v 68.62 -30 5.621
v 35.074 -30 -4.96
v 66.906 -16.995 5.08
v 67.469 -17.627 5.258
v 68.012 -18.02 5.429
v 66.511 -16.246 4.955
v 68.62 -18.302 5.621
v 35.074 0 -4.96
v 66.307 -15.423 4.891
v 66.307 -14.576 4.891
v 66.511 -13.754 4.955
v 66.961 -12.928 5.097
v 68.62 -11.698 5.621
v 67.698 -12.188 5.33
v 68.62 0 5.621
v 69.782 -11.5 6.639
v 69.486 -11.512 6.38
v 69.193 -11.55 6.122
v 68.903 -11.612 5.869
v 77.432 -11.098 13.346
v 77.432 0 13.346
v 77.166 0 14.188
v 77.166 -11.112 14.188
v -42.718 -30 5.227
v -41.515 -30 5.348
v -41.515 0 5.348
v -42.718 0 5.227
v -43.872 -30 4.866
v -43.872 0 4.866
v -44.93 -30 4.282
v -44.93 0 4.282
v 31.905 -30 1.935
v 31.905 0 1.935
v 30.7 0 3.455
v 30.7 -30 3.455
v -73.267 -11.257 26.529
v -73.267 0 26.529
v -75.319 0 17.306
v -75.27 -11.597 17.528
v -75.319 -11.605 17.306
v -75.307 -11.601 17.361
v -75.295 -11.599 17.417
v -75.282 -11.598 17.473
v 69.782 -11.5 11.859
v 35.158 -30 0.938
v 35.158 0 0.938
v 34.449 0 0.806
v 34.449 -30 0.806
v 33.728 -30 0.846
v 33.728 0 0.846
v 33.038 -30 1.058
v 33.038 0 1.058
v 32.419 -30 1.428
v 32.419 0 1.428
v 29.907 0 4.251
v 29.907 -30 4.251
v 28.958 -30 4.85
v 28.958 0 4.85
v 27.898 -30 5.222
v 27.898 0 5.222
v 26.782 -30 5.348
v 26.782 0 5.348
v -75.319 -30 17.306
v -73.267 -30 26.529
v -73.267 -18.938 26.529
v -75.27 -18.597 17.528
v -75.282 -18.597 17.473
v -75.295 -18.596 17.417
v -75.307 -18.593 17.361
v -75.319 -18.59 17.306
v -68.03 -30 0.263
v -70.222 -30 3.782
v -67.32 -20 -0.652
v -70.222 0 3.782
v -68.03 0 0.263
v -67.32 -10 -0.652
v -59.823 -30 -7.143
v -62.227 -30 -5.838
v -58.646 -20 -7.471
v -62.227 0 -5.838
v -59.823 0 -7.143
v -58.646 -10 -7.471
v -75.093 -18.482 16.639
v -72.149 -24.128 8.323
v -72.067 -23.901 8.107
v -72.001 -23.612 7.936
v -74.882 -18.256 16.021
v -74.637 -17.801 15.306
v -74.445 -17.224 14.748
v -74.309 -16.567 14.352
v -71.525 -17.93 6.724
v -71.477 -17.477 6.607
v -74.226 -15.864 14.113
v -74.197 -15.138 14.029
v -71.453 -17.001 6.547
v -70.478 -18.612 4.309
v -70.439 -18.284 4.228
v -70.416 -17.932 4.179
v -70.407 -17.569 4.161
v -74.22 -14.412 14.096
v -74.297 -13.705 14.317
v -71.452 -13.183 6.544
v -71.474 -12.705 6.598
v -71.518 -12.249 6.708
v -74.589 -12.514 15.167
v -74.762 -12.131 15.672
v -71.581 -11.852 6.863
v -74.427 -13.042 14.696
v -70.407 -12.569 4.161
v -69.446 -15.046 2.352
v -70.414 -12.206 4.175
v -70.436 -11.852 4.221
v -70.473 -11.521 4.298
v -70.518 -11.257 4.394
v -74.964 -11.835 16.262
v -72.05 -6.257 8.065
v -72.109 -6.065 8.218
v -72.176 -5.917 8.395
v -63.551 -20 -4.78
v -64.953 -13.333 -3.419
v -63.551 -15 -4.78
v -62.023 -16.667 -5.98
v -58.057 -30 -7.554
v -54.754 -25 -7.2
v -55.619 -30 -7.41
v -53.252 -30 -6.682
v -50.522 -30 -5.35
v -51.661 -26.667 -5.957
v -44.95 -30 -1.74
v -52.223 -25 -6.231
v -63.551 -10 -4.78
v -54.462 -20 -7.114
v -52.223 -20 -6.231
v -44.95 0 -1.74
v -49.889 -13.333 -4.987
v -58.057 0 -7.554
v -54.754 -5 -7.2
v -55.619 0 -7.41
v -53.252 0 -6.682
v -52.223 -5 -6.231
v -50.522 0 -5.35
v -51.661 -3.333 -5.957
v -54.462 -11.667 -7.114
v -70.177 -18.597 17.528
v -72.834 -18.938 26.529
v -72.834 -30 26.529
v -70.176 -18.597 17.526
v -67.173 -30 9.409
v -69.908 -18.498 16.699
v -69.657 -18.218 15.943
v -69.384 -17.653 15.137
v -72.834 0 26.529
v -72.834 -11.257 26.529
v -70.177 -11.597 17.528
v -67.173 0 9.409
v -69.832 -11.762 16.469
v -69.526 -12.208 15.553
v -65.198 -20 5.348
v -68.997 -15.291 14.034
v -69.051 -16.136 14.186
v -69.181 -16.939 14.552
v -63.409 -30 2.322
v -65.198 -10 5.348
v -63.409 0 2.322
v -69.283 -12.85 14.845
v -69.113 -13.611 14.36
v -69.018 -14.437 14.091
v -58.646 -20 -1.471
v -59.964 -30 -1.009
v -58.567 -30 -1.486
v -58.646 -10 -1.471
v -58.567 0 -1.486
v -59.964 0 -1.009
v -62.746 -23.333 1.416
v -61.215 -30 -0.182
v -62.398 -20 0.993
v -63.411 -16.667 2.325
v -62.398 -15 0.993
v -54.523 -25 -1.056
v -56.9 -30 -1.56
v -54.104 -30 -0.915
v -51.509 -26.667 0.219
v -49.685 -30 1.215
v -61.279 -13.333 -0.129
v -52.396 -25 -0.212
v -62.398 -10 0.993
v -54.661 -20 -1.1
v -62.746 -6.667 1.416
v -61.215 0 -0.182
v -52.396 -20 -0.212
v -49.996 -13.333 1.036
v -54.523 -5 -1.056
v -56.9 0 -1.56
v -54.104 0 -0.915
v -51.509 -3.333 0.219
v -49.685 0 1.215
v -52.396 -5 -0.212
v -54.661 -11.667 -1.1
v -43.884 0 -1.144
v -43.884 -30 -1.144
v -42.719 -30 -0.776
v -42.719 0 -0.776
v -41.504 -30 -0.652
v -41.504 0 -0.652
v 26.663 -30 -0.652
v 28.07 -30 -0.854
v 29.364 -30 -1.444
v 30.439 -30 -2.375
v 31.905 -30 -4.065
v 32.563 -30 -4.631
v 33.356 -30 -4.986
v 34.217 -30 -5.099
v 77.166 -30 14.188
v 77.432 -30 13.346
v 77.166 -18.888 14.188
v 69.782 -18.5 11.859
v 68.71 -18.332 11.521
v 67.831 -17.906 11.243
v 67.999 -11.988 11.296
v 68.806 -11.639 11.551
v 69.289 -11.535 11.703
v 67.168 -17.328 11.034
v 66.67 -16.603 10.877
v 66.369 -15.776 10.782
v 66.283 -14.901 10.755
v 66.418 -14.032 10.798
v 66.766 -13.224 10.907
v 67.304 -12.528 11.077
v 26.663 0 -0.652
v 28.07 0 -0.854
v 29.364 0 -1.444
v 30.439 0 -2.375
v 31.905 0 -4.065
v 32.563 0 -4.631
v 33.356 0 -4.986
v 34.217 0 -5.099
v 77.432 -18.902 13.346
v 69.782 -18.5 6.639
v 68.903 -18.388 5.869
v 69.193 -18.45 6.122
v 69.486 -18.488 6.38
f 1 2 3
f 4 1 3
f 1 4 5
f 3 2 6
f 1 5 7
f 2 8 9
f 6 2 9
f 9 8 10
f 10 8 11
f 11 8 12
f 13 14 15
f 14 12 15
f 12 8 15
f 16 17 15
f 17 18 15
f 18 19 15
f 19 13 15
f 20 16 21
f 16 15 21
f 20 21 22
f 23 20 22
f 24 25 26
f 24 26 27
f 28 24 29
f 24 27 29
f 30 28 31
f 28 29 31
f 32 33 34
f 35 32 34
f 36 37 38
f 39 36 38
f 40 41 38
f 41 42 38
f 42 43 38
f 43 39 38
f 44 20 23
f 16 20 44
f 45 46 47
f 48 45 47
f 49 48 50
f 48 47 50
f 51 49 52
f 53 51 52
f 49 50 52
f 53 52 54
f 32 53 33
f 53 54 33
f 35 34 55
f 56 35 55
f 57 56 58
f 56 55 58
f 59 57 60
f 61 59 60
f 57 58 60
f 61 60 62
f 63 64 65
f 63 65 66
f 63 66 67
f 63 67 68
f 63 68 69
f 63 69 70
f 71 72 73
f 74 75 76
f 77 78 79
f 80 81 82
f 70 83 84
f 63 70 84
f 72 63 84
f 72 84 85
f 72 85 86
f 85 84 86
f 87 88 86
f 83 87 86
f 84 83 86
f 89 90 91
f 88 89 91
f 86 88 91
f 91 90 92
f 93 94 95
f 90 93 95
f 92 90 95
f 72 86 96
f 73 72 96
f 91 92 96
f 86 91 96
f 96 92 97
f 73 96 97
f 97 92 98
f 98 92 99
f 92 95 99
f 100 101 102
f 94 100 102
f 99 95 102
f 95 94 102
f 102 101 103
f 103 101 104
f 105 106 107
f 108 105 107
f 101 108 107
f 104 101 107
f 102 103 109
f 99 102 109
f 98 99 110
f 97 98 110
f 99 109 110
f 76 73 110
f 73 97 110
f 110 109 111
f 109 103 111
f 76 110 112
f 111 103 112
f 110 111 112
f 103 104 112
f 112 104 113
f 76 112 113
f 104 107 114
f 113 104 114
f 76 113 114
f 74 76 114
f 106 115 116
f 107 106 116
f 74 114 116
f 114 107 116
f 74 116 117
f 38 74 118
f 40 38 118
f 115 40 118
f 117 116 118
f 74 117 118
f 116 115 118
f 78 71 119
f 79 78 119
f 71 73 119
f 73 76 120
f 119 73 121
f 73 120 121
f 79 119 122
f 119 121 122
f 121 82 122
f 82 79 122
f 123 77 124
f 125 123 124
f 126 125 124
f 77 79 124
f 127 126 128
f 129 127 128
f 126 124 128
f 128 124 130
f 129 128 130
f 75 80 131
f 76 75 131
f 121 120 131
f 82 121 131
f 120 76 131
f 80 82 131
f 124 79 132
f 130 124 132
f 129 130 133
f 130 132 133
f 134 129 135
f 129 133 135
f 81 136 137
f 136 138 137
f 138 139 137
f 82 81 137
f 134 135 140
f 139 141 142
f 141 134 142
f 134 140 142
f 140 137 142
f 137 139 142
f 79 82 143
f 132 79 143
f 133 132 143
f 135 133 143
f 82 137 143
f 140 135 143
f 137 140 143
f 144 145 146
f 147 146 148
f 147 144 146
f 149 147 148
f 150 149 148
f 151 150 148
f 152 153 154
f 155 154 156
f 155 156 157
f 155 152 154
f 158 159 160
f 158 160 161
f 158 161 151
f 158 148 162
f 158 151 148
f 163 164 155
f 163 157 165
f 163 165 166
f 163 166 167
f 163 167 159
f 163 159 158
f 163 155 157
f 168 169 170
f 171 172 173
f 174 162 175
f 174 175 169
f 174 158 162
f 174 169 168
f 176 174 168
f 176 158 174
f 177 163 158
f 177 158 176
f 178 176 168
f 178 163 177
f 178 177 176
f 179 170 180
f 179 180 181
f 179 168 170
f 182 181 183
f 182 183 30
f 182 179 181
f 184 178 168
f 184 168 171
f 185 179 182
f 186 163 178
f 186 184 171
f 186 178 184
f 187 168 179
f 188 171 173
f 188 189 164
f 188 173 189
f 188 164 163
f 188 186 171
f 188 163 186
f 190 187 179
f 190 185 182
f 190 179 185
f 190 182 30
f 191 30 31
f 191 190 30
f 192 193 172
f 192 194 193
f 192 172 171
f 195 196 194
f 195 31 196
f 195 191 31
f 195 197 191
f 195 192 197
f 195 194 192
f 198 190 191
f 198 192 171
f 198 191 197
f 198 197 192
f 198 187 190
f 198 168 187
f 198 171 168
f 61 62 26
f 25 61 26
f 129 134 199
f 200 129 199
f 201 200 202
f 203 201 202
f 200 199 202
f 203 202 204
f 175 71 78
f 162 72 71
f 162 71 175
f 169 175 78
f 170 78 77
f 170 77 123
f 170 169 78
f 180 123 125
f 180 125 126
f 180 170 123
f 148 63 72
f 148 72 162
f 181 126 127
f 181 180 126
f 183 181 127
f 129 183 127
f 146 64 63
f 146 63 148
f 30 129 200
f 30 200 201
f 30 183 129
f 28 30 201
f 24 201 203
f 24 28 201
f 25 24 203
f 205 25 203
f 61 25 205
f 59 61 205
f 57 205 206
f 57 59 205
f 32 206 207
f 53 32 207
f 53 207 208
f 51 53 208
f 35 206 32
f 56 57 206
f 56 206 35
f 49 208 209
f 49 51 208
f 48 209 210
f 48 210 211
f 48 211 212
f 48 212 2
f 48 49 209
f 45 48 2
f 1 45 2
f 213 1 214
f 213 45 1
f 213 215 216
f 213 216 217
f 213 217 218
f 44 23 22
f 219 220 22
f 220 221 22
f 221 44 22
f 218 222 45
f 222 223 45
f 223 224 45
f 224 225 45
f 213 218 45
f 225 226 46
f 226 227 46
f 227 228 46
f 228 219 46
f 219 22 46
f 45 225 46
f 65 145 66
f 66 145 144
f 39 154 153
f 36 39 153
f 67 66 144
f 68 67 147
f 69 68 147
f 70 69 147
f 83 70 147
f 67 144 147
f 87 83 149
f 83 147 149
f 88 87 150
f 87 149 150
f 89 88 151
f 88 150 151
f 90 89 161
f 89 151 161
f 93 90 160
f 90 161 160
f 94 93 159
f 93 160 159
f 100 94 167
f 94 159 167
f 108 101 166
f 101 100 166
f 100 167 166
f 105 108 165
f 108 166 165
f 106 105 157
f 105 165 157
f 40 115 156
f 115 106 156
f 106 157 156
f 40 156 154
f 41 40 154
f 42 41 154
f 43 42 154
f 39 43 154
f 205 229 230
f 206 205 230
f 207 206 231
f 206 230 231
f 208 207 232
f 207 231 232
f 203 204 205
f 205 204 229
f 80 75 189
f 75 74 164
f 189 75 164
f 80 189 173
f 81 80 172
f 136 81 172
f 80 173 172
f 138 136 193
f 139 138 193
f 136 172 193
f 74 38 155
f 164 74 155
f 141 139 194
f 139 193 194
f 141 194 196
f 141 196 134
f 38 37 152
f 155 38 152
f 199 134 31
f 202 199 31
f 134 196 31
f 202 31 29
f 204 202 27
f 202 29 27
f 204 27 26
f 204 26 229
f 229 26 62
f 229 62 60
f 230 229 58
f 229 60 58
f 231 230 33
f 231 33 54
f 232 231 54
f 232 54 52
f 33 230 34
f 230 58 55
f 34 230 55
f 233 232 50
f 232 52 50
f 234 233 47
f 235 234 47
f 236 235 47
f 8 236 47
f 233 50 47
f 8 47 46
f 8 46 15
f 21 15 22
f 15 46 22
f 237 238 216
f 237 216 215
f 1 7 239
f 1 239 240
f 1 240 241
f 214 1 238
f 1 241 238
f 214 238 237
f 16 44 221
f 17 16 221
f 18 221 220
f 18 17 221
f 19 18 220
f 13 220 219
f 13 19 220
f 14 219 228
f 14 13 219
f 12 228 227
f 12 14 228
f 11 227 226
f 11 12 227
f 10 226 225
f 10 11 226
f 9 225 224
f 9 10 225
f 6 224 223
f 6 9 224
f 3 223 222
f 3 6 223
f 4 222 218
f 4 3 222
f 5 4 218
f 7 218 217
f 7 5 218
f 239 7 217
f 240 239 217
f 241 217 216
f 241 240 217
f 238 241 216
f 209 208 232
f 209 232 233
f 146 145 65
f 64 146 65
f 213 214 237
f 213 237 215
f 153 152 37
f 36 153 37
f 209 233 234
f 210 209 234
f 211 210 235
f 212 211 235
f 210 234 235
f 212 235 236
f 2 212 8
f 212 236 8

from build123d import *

# Parameters (mm, degrees)
F1_DEPTH = 30
F3_START = -60
F3_DEPTH = 20
F5_DEPTH = 15


with BuildPart() as f1:
    # F0 (on Front) → F1 (new body)
    with BuildSketch(Plane.XZ):
        with BuildLine():
            Line((-73.2672911175, 26.5288166702), (-75.3194466233, 17.3055510968))
            add(Edge.make_bspline(
                [(-75.3194466233, 17.3055510968), (-70.9649776781, 4.4868251649), (-69.3683816602, 1.5297526715), (-58.7741680812, -10.797200258), (-50.064963712, -5.329070788), (-44.9501895242, -1.7400602878)],
                knots=[0, 0, 0, 0, 0.374435083, 0.6549537817, 0.9687940857, 0.9687940857, 0.9687940857, 0.9687940857], degree=3))
            ThreePointArc((-44.9501895242, -1.7400602878), (-43.310919022, -0.9301366905), (-41.5038310897, -0.6515380228))
            Line((-41.5038310897, -0.6515380228), (26.6625816426, -0.6515380228))
            ThreePointArc((26.6625816426, -0.6515380228), (28.7383095769, -1.1027630731), (30.4393893345, -2.3749966056))
            Line((30.4393893345, -2.3749966056), (31.9053379066, -4.0647679645))
            ThreePointArc((31.9053379066, -4.0647679645), (33.3557980505, -4.9858409878), (35.0738020651, -4.9599112993))
            Line((35.0738020651, -4.9599112993), (68.6204453138, 5.6206840096))
            Line((68.6204453138, 5.6206840096), (77.4316421282, 13.3455851134))
            Line((77.4316421282, 13.3455851134), (77.1660596132, 14.18763621))
            Line((77.1660596132, 14.18763621), (35.1581896409, 0.9383740209))
            ThreePointArc((35.1581896409, 0.9383740209), (33.3767909305, 0.9311107565), (31.9053377109, 1.9352320355))
            Line((31.9053377109, 1.9352320355), (30.6995972244, 3.4554789281))
            ThreePointArc((30.6995972244, 3.4554789281), (28.9575644986, 4.8504107083), (26.7821432468, 5.3484619772))
            Line((26.7821432468, 5.3484619772), (-41.5150223961, 5.3484619772))
            ThreePointArc((-41.5150223961, 5.3484619772), (-43.3039602481, 5.0755643302), (-44.9301657899, 4.2816957645))
            add(Edge.make_bspline(
                [(-72.8339403868, 26.5288166702), (-69.6615353227, 15.0968804955), (-66.54271386, 6.9837829262), (-59.2191643212, -4.6015653314), (-50.1028643922, 0.7007774012), (-44.9301657899, 4.2816957645)],
                knots=[0, 0, 0, 0, 0.3985404471, 0.6568286308, 0.9694419113, 0.9694419113, 0.9694419113, 0.9694419113], degree=3))
            Line((-72.8339403868, 26.5288166702), (-73.2672911175, 26.5288166702))
        make_face()
    extrude(amount=F1_DEPTH)

    # F2 (on Right) → F3 (cut)
    with BuildSketch(Plane.YZ.offset(F3_START)):
        with BuildLine():
            ThreePointArc((-18.5974218494, 17.528353259), (-15.0974218494, 14.028353259), (-11.5974218494, 17.528353259))
            Line((-11.5974218494, 17.528353259), (-11.2484100663, 26.7637830809))
            Line((-11.2484100663, 26.7637830809), (-18.946434269, 26.7637830809))
            Line((-18.946434269, 26.7637830809), (-18.5974218494, 17.528353259))
        make_face()
    extrude(amount=-F3_DEPTH, mode=Mode.SUBTRACT)

    # F4 (on Top) → F5 (cut)
    with BuildSketch(Plane.XY):
        with BuildLine():
            Line((78.2688707113, -11.0539328307), (69.7815798237, -11.5))
            ThreePointArc((69.7815798237, -11.5), (66.2815798237, -15), (69.7815798237, -18.5))
            Line((69.7815798237, -18.5), (78.2688707113, -18.9460671693))
            Line((78.2688707113, -18.9460671693), (78.2688707113, -11.0539328307))
        make_face()
    extrude(amount=F5_DEPTH, mode=Mode.SUBTRACT)


solid = f1.part
